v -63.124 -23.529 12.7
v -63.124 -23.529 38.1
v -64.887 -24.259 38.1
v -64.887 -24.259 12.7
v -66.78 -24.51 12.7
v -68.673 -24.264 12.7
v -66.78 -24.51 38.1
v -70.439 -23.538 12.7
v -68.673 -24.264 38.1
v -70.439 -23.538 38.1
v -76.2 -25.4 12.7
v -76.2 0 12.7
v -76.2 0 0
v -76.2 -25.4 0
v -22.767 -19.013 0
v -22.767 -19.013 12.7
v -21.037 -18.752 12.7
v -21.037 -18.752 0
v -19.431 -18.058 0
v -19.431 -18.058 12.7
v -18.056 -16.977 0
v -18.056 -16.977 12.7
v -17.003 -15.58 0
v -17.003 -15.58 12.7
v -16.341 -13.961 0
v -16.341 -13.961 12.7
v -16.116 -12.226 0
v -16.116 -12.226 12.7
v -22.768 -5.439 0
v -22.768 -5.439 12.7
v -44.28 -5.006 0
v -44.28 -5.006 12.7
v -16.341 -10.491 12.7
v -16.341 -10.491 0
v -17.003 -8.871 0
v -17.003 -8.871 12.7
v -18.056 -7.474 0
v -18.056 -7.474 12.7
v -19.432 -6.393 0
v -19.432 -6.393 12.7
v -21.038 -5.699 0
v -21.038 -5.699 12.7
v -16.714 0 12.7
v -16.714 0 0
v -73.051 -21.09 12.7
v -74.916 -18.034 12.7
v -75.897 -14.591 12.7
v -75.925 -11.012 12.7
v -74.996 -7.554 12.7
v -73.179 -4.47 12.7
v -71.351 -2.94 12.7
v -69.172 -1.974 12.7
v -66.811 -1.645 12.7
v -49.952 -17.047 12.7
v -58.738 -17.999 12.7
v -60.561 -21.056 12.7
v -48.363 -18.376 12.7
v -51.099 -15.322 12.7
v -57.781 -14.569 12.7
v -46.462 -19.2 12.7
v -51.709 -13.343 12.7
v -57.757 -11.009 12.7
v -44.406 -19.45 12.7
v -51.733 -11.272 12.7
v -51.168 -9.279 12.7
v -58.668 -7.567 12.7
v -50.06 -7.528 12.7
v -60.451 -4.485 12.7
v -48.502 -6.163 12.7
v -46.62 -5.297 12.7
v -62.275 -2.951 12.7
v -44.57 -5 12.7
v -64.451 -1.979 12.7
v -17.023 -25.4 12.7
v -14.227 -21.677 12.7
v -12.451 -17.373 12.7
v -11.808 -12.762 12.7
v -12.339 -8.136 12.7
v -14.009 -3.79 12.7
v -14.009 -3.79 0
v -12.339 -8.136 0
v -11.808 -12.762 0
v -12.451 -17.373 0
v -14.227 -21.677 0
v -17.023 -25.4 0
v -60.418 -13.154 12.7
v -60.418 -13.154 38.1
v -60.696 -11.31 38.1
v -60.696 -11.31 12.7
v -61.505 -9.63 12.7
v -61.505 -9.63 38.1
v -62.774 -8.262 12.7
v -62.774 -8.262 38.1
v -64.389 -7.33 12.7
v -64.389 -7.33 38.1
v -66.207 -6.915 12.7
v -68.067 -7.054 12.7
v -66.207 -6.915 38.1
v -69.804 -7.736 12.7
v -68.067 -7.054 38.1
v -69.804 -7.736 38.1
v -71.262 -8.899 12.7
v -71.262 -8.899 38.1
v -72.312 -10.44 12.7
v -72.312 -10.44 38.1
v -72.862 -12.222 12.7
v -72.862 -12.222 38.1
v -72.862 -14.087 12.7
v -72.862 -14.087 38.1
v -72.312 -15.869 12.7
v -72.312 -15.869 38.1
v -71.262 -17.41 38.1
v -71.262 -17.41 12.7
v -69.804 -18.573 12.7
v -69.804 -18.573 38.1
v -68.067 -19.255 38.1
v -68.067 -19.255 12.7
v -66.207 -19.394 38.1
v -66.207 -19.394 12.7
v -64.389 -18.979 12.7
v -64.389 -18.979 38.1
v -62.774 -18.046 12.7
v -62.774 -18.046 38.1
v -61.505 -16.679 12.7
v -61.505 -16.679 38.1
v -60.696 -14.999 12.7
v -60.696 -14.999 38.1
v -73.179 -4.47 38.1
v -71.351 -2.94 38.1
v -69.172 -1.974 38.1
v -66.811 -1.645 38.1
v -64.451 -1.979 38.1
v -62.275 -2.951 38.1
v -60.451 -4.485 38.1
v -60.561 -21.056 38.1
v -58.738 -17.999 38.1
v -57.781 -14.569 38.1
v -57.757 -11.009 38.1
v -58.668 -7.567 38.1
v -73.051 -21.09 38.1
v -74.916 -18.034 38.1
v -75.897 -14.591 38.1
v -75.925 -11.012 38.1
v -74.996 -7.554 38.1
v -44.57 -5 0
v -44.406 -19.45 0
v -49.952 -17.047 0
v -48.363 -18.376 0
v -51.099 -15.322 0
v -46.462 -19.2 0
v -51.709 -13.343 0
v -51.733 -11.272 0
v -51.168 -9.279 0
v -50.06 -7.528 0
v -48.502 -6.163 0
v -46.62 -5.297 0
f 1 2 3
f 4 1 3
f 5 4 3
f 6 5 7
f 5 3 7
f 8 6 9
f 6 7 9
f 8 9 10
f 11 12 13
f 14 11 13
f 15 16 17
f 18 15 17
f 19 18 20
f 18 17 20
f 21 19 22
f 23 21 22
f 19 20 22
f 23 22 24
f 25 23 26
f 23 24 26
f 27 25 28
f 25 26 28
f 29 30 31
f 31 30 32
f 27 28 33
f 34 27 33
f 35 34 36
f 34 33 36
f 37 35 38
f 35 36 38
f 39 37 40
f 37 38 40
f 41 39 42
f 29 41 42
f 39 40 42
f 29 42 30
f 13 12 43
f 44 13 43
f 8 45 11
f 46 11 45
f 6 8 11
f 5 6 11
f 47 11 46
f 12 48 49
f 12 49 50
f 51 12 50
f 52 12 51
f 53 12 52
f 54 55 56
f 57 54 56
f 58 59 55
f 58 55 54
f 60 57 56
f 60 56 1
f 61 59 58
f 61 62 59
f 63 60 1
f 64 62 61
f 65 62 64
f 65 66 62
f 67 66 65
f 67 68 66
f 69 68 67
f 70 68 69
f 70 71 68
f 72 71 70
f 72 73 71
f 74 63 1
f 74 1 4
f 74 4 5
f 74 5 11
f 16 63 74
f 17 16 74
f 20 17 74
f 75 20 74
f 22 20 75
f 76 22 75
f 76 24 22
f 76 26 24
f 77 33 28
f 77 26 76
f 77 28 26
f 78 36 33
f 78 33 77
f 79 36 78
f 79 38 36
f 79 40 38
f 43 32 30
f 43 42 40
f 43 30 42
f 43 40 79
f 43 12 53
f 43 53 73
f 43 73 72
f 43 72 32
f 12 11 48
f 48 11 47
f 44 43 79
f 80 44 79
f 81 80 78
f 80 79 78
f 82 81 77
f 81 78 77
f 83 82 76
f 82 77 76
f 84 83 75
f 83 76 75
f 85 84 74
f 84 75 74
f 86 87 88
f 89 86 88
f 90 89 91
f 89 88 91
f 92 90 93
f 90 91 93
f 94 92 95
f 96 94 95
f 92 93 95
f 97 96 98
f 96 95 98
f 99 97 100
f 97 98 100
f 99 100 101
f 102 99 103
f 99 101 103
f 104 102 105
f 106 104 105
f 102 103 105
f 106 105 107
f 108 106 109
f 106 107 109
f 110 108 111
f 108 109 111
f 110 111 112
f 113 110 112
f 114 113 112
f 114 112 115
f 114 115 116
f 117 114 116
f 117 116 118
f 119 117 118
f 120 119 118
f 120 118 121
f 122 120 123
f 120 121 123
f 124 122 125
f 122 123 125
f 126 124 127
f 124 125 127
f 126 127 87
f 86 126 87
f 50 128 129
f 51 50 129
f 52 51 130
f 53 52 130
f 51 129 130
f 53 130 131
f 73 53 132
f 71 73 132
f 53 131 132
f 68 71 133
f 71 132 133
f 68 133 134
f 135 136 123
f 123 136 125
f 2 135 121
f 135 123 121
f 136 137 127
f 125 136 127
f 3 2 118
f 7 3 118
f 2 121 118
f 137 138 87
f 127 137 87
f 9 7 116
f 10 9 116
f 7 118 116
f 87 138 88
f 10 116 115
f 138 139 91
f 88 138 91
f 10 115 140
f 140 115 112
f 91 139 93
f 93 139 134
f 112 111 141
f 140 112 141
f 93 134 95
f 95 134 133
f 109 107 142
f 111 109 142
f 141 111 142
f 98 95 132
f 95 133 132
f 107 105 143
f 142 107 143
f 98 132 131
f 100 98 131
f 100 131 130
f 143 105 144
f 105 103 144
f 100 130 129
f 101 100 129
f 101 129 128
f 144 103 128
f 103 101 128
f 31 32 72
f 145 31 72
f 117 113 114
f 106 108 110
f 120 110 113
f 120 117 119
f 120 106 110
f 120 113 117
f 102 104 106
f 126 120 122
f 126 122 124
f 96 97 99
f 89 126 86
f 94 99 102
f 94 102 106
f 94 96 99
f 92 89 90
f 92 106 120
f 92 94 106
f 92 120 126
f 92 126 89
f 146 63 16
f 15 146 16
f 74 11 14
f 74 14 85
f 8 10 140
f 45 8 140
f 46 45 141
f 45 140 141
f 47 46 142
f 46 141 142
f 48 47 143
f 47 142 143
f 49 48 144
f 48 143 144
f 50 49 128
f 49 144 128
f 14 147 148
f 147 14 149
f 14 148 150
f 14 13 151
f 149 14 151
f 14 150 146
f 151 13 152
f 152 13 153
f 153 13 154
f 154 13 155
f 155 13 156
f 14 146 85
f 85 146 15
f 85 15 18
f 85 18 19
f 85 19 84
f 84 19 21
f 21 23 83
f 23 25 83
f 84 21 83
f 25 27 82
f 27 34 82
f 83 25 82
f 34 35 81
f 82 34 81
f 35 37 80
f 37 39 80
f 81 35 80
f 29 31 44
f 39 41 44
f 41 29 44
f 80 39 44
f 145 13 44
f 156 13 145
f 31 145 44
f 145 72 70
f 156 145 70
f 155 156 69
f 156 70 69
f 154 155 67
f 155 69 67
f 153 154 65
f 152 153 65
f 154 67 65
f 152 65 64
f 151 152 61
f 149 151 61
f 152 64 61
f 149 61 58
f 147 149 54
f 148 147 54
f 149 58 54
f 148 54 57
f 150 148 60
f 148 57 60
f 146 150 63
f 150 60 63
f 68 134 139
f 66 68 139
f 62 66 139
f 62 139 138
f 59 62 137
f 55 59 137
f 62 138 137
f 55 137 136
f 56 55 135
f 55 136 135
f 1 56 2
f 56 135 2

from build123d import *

# Parameters (mm, degrees)
F1_DEPTH  = 25.4
F2_R      = 6.2570868775
F3_DEPTH  = 25.4
F5_DEPTH  = 19.05
F7_DEPTH  = 19.05
F8_R      = 6.2570868775
F9_DEPTH  = 25.4
F11_DEPTH = 25.4


with BuildPart() as f1:
    # F0 (on Front) → F1 (new body)
    with BuildSketch(Plane.XZ):
        Polygon((-76.2, 0), (0, 0), (0, 12.7), (-57.15, 12.7), (-57.15, 38.1), (-76.2, 38.1), align=None)
    extrude(amount=F1_DEPTH)

    # F2 (on face) → F3 (cut)
    with BuildSketch(Plane.XY.offset(38.1)):
        with Locations((-66.675, -13.1544489413)):
            Circle(F2_R)
    extrude(amount=-F3_DEPTH, mode=Mode.SUBTRACT)

    # F4 (on face) → F5 (cut)
    with BuildSketch(Plane.XY.offset(12.7)):
        with BuildLine():
            ThreePointArc((-22.7675971567, -5.4390591716), (-29.692432865, -12.2261255428), (-22.7671458535, -19.0127314193))
            ThreePointArc((-22.7671458535, -19.0127314193), (-18.0560040915, -16.977183947), (-16.1160016177, -12.2258998454))
            ThreePointArc((-16.1160016177, -12.2258998454), (-18.0561620669, -7.4744545509), (-22.7675971567, -5.4390591716))
        make_face()
        with BuildLine():
            Line((-44.2795754893, -5.0060199297), (-44.5703677833, -5.0001662387))
            ThreePointArc((-44.5703677833, -5.0001662387), (-51.7956349782, -12.3079980641), (-44.4061819446, -19.449767865))
            ThreePointArc((-44.4061819446, -19.449767865), (-39.4032801468, -17.2768830676), (-37.3446341766, -12.2258998454))
            ThreePointArc((-37.3446341766, -12.2258998454), (-39.3592060219, -7.220400944), (-44.2795754893, -5.0060199297))
        make_face()
        with BuildLine():
            ThreePointArc((-37.3446341766, -12.2258998454), (-39.4032801468, -17.2768830676), (-44.4061819446, -19.449767865))
            Line((-44.4061819446, -19.449767865), (-22.7671458535, -19.0127314193))
            ThreePointArc((-22.7671458535, -19.0127314193), (-29.692432865, -12.2261255428), (-22.7675971567, -5.4390591716))
            Line((-22.7675971567, -5.4390591716), (-44.2795754893, -5.0060199297))
            ThreePointArc((-44.2795754893, -5.0060199297), (-39.3592060219, -7.220400944), (-37.3446341766, -12.2258998454))
        make_face()
    extrude(amount=-F5_DEPTH, mode=Mode.SUBTRACT)

    # F6 (on face) → F7 (cut)
    with BuildSketch(Plane.XY.offset(12.7)):
        with BuildLine():
            ThreePointArc((-16.7138874531, 0), (-11.8080190768, -12.761667067), (-17.0234031975, -25.4))
            Line((-17.0234031975, -25.4), (0, -25.4))
            Line((0, -25.4), (0, 0))
            Line((0, 0), (-16.7138874531, 0))
        make_face()
    extrude(amount=-F7_DEPTH, mode=Mode.SUBTRACT)

    # F8 (on face) → F9 (cut)
    with BuildSketch(Plane.XY.offset(38.1)):
        with BuildLine():
            ThreePointArc((-66.675, 0), (-57.6500295177, -12.7), (-66.675, -25.4))
            Line((-66.675, -25.4), (-57.15, -25.4))
            Line((-57.15, -25.4), (-57.15, 0))
            Line((-57.15, 0), (-66.675, 0))
        make_face()
        with BuildLine():
            Line((-76.2, -25.4), (-66.675, -25.4))
            ThreePointArc((-66.675, -25.4), (-76.0323616205, -12.7), (-66.675, 0))
            Line((-66.675, 0), (-76.2, 0))
            Line((-76.2, 0), (-76.2, -25.4))
        make_face()
        with Locations((-66.675, -13.1544489413)):
            Circle(F8_R)
    extrude(amount=-F9_DEPTH, mode=Mode.SUBTRACT)

    # F10 (on face) → F11 (cut)
    with BuildSketch(Plane.XY.offset(38.1)):
        with BuildLine():
            ThreePointArc((-73.1792891103, -4.4698874424), (-66.811491799, -1.6448572711), (-60.4505532037, -4.4852970704))
            ThreePointArc((-60.4505532037, -4.4852970704), (-63.2361374685, -1.7893568412), (-66.675, 0))
            ThreePointArc((-66.675, 0), (-70.2664103908, -1.7412661714), (-73.1792891103, -4.4698874424))
        make_face()
        with BuildLine():
            ThreePointArc((-66.675, -25.4), (-64.8290367019, -24.5975628429), (-63.1235156823, -23.5285988862))
            ThreePointArc((-63.1235156823, -23.5285988862), (-66.7799965121, -24.5102265659), (-70.439013249, -23.5380941269))
            ThreePointArc((-70.439013249, -23.5380941269), (-68.6309718215, -24.6185744834), (-66.675, -25.4))
        make_face()
    extrude(amount=-F11_DEPTH, mode=Mode.SUBTRACT)


solid = f1.part
